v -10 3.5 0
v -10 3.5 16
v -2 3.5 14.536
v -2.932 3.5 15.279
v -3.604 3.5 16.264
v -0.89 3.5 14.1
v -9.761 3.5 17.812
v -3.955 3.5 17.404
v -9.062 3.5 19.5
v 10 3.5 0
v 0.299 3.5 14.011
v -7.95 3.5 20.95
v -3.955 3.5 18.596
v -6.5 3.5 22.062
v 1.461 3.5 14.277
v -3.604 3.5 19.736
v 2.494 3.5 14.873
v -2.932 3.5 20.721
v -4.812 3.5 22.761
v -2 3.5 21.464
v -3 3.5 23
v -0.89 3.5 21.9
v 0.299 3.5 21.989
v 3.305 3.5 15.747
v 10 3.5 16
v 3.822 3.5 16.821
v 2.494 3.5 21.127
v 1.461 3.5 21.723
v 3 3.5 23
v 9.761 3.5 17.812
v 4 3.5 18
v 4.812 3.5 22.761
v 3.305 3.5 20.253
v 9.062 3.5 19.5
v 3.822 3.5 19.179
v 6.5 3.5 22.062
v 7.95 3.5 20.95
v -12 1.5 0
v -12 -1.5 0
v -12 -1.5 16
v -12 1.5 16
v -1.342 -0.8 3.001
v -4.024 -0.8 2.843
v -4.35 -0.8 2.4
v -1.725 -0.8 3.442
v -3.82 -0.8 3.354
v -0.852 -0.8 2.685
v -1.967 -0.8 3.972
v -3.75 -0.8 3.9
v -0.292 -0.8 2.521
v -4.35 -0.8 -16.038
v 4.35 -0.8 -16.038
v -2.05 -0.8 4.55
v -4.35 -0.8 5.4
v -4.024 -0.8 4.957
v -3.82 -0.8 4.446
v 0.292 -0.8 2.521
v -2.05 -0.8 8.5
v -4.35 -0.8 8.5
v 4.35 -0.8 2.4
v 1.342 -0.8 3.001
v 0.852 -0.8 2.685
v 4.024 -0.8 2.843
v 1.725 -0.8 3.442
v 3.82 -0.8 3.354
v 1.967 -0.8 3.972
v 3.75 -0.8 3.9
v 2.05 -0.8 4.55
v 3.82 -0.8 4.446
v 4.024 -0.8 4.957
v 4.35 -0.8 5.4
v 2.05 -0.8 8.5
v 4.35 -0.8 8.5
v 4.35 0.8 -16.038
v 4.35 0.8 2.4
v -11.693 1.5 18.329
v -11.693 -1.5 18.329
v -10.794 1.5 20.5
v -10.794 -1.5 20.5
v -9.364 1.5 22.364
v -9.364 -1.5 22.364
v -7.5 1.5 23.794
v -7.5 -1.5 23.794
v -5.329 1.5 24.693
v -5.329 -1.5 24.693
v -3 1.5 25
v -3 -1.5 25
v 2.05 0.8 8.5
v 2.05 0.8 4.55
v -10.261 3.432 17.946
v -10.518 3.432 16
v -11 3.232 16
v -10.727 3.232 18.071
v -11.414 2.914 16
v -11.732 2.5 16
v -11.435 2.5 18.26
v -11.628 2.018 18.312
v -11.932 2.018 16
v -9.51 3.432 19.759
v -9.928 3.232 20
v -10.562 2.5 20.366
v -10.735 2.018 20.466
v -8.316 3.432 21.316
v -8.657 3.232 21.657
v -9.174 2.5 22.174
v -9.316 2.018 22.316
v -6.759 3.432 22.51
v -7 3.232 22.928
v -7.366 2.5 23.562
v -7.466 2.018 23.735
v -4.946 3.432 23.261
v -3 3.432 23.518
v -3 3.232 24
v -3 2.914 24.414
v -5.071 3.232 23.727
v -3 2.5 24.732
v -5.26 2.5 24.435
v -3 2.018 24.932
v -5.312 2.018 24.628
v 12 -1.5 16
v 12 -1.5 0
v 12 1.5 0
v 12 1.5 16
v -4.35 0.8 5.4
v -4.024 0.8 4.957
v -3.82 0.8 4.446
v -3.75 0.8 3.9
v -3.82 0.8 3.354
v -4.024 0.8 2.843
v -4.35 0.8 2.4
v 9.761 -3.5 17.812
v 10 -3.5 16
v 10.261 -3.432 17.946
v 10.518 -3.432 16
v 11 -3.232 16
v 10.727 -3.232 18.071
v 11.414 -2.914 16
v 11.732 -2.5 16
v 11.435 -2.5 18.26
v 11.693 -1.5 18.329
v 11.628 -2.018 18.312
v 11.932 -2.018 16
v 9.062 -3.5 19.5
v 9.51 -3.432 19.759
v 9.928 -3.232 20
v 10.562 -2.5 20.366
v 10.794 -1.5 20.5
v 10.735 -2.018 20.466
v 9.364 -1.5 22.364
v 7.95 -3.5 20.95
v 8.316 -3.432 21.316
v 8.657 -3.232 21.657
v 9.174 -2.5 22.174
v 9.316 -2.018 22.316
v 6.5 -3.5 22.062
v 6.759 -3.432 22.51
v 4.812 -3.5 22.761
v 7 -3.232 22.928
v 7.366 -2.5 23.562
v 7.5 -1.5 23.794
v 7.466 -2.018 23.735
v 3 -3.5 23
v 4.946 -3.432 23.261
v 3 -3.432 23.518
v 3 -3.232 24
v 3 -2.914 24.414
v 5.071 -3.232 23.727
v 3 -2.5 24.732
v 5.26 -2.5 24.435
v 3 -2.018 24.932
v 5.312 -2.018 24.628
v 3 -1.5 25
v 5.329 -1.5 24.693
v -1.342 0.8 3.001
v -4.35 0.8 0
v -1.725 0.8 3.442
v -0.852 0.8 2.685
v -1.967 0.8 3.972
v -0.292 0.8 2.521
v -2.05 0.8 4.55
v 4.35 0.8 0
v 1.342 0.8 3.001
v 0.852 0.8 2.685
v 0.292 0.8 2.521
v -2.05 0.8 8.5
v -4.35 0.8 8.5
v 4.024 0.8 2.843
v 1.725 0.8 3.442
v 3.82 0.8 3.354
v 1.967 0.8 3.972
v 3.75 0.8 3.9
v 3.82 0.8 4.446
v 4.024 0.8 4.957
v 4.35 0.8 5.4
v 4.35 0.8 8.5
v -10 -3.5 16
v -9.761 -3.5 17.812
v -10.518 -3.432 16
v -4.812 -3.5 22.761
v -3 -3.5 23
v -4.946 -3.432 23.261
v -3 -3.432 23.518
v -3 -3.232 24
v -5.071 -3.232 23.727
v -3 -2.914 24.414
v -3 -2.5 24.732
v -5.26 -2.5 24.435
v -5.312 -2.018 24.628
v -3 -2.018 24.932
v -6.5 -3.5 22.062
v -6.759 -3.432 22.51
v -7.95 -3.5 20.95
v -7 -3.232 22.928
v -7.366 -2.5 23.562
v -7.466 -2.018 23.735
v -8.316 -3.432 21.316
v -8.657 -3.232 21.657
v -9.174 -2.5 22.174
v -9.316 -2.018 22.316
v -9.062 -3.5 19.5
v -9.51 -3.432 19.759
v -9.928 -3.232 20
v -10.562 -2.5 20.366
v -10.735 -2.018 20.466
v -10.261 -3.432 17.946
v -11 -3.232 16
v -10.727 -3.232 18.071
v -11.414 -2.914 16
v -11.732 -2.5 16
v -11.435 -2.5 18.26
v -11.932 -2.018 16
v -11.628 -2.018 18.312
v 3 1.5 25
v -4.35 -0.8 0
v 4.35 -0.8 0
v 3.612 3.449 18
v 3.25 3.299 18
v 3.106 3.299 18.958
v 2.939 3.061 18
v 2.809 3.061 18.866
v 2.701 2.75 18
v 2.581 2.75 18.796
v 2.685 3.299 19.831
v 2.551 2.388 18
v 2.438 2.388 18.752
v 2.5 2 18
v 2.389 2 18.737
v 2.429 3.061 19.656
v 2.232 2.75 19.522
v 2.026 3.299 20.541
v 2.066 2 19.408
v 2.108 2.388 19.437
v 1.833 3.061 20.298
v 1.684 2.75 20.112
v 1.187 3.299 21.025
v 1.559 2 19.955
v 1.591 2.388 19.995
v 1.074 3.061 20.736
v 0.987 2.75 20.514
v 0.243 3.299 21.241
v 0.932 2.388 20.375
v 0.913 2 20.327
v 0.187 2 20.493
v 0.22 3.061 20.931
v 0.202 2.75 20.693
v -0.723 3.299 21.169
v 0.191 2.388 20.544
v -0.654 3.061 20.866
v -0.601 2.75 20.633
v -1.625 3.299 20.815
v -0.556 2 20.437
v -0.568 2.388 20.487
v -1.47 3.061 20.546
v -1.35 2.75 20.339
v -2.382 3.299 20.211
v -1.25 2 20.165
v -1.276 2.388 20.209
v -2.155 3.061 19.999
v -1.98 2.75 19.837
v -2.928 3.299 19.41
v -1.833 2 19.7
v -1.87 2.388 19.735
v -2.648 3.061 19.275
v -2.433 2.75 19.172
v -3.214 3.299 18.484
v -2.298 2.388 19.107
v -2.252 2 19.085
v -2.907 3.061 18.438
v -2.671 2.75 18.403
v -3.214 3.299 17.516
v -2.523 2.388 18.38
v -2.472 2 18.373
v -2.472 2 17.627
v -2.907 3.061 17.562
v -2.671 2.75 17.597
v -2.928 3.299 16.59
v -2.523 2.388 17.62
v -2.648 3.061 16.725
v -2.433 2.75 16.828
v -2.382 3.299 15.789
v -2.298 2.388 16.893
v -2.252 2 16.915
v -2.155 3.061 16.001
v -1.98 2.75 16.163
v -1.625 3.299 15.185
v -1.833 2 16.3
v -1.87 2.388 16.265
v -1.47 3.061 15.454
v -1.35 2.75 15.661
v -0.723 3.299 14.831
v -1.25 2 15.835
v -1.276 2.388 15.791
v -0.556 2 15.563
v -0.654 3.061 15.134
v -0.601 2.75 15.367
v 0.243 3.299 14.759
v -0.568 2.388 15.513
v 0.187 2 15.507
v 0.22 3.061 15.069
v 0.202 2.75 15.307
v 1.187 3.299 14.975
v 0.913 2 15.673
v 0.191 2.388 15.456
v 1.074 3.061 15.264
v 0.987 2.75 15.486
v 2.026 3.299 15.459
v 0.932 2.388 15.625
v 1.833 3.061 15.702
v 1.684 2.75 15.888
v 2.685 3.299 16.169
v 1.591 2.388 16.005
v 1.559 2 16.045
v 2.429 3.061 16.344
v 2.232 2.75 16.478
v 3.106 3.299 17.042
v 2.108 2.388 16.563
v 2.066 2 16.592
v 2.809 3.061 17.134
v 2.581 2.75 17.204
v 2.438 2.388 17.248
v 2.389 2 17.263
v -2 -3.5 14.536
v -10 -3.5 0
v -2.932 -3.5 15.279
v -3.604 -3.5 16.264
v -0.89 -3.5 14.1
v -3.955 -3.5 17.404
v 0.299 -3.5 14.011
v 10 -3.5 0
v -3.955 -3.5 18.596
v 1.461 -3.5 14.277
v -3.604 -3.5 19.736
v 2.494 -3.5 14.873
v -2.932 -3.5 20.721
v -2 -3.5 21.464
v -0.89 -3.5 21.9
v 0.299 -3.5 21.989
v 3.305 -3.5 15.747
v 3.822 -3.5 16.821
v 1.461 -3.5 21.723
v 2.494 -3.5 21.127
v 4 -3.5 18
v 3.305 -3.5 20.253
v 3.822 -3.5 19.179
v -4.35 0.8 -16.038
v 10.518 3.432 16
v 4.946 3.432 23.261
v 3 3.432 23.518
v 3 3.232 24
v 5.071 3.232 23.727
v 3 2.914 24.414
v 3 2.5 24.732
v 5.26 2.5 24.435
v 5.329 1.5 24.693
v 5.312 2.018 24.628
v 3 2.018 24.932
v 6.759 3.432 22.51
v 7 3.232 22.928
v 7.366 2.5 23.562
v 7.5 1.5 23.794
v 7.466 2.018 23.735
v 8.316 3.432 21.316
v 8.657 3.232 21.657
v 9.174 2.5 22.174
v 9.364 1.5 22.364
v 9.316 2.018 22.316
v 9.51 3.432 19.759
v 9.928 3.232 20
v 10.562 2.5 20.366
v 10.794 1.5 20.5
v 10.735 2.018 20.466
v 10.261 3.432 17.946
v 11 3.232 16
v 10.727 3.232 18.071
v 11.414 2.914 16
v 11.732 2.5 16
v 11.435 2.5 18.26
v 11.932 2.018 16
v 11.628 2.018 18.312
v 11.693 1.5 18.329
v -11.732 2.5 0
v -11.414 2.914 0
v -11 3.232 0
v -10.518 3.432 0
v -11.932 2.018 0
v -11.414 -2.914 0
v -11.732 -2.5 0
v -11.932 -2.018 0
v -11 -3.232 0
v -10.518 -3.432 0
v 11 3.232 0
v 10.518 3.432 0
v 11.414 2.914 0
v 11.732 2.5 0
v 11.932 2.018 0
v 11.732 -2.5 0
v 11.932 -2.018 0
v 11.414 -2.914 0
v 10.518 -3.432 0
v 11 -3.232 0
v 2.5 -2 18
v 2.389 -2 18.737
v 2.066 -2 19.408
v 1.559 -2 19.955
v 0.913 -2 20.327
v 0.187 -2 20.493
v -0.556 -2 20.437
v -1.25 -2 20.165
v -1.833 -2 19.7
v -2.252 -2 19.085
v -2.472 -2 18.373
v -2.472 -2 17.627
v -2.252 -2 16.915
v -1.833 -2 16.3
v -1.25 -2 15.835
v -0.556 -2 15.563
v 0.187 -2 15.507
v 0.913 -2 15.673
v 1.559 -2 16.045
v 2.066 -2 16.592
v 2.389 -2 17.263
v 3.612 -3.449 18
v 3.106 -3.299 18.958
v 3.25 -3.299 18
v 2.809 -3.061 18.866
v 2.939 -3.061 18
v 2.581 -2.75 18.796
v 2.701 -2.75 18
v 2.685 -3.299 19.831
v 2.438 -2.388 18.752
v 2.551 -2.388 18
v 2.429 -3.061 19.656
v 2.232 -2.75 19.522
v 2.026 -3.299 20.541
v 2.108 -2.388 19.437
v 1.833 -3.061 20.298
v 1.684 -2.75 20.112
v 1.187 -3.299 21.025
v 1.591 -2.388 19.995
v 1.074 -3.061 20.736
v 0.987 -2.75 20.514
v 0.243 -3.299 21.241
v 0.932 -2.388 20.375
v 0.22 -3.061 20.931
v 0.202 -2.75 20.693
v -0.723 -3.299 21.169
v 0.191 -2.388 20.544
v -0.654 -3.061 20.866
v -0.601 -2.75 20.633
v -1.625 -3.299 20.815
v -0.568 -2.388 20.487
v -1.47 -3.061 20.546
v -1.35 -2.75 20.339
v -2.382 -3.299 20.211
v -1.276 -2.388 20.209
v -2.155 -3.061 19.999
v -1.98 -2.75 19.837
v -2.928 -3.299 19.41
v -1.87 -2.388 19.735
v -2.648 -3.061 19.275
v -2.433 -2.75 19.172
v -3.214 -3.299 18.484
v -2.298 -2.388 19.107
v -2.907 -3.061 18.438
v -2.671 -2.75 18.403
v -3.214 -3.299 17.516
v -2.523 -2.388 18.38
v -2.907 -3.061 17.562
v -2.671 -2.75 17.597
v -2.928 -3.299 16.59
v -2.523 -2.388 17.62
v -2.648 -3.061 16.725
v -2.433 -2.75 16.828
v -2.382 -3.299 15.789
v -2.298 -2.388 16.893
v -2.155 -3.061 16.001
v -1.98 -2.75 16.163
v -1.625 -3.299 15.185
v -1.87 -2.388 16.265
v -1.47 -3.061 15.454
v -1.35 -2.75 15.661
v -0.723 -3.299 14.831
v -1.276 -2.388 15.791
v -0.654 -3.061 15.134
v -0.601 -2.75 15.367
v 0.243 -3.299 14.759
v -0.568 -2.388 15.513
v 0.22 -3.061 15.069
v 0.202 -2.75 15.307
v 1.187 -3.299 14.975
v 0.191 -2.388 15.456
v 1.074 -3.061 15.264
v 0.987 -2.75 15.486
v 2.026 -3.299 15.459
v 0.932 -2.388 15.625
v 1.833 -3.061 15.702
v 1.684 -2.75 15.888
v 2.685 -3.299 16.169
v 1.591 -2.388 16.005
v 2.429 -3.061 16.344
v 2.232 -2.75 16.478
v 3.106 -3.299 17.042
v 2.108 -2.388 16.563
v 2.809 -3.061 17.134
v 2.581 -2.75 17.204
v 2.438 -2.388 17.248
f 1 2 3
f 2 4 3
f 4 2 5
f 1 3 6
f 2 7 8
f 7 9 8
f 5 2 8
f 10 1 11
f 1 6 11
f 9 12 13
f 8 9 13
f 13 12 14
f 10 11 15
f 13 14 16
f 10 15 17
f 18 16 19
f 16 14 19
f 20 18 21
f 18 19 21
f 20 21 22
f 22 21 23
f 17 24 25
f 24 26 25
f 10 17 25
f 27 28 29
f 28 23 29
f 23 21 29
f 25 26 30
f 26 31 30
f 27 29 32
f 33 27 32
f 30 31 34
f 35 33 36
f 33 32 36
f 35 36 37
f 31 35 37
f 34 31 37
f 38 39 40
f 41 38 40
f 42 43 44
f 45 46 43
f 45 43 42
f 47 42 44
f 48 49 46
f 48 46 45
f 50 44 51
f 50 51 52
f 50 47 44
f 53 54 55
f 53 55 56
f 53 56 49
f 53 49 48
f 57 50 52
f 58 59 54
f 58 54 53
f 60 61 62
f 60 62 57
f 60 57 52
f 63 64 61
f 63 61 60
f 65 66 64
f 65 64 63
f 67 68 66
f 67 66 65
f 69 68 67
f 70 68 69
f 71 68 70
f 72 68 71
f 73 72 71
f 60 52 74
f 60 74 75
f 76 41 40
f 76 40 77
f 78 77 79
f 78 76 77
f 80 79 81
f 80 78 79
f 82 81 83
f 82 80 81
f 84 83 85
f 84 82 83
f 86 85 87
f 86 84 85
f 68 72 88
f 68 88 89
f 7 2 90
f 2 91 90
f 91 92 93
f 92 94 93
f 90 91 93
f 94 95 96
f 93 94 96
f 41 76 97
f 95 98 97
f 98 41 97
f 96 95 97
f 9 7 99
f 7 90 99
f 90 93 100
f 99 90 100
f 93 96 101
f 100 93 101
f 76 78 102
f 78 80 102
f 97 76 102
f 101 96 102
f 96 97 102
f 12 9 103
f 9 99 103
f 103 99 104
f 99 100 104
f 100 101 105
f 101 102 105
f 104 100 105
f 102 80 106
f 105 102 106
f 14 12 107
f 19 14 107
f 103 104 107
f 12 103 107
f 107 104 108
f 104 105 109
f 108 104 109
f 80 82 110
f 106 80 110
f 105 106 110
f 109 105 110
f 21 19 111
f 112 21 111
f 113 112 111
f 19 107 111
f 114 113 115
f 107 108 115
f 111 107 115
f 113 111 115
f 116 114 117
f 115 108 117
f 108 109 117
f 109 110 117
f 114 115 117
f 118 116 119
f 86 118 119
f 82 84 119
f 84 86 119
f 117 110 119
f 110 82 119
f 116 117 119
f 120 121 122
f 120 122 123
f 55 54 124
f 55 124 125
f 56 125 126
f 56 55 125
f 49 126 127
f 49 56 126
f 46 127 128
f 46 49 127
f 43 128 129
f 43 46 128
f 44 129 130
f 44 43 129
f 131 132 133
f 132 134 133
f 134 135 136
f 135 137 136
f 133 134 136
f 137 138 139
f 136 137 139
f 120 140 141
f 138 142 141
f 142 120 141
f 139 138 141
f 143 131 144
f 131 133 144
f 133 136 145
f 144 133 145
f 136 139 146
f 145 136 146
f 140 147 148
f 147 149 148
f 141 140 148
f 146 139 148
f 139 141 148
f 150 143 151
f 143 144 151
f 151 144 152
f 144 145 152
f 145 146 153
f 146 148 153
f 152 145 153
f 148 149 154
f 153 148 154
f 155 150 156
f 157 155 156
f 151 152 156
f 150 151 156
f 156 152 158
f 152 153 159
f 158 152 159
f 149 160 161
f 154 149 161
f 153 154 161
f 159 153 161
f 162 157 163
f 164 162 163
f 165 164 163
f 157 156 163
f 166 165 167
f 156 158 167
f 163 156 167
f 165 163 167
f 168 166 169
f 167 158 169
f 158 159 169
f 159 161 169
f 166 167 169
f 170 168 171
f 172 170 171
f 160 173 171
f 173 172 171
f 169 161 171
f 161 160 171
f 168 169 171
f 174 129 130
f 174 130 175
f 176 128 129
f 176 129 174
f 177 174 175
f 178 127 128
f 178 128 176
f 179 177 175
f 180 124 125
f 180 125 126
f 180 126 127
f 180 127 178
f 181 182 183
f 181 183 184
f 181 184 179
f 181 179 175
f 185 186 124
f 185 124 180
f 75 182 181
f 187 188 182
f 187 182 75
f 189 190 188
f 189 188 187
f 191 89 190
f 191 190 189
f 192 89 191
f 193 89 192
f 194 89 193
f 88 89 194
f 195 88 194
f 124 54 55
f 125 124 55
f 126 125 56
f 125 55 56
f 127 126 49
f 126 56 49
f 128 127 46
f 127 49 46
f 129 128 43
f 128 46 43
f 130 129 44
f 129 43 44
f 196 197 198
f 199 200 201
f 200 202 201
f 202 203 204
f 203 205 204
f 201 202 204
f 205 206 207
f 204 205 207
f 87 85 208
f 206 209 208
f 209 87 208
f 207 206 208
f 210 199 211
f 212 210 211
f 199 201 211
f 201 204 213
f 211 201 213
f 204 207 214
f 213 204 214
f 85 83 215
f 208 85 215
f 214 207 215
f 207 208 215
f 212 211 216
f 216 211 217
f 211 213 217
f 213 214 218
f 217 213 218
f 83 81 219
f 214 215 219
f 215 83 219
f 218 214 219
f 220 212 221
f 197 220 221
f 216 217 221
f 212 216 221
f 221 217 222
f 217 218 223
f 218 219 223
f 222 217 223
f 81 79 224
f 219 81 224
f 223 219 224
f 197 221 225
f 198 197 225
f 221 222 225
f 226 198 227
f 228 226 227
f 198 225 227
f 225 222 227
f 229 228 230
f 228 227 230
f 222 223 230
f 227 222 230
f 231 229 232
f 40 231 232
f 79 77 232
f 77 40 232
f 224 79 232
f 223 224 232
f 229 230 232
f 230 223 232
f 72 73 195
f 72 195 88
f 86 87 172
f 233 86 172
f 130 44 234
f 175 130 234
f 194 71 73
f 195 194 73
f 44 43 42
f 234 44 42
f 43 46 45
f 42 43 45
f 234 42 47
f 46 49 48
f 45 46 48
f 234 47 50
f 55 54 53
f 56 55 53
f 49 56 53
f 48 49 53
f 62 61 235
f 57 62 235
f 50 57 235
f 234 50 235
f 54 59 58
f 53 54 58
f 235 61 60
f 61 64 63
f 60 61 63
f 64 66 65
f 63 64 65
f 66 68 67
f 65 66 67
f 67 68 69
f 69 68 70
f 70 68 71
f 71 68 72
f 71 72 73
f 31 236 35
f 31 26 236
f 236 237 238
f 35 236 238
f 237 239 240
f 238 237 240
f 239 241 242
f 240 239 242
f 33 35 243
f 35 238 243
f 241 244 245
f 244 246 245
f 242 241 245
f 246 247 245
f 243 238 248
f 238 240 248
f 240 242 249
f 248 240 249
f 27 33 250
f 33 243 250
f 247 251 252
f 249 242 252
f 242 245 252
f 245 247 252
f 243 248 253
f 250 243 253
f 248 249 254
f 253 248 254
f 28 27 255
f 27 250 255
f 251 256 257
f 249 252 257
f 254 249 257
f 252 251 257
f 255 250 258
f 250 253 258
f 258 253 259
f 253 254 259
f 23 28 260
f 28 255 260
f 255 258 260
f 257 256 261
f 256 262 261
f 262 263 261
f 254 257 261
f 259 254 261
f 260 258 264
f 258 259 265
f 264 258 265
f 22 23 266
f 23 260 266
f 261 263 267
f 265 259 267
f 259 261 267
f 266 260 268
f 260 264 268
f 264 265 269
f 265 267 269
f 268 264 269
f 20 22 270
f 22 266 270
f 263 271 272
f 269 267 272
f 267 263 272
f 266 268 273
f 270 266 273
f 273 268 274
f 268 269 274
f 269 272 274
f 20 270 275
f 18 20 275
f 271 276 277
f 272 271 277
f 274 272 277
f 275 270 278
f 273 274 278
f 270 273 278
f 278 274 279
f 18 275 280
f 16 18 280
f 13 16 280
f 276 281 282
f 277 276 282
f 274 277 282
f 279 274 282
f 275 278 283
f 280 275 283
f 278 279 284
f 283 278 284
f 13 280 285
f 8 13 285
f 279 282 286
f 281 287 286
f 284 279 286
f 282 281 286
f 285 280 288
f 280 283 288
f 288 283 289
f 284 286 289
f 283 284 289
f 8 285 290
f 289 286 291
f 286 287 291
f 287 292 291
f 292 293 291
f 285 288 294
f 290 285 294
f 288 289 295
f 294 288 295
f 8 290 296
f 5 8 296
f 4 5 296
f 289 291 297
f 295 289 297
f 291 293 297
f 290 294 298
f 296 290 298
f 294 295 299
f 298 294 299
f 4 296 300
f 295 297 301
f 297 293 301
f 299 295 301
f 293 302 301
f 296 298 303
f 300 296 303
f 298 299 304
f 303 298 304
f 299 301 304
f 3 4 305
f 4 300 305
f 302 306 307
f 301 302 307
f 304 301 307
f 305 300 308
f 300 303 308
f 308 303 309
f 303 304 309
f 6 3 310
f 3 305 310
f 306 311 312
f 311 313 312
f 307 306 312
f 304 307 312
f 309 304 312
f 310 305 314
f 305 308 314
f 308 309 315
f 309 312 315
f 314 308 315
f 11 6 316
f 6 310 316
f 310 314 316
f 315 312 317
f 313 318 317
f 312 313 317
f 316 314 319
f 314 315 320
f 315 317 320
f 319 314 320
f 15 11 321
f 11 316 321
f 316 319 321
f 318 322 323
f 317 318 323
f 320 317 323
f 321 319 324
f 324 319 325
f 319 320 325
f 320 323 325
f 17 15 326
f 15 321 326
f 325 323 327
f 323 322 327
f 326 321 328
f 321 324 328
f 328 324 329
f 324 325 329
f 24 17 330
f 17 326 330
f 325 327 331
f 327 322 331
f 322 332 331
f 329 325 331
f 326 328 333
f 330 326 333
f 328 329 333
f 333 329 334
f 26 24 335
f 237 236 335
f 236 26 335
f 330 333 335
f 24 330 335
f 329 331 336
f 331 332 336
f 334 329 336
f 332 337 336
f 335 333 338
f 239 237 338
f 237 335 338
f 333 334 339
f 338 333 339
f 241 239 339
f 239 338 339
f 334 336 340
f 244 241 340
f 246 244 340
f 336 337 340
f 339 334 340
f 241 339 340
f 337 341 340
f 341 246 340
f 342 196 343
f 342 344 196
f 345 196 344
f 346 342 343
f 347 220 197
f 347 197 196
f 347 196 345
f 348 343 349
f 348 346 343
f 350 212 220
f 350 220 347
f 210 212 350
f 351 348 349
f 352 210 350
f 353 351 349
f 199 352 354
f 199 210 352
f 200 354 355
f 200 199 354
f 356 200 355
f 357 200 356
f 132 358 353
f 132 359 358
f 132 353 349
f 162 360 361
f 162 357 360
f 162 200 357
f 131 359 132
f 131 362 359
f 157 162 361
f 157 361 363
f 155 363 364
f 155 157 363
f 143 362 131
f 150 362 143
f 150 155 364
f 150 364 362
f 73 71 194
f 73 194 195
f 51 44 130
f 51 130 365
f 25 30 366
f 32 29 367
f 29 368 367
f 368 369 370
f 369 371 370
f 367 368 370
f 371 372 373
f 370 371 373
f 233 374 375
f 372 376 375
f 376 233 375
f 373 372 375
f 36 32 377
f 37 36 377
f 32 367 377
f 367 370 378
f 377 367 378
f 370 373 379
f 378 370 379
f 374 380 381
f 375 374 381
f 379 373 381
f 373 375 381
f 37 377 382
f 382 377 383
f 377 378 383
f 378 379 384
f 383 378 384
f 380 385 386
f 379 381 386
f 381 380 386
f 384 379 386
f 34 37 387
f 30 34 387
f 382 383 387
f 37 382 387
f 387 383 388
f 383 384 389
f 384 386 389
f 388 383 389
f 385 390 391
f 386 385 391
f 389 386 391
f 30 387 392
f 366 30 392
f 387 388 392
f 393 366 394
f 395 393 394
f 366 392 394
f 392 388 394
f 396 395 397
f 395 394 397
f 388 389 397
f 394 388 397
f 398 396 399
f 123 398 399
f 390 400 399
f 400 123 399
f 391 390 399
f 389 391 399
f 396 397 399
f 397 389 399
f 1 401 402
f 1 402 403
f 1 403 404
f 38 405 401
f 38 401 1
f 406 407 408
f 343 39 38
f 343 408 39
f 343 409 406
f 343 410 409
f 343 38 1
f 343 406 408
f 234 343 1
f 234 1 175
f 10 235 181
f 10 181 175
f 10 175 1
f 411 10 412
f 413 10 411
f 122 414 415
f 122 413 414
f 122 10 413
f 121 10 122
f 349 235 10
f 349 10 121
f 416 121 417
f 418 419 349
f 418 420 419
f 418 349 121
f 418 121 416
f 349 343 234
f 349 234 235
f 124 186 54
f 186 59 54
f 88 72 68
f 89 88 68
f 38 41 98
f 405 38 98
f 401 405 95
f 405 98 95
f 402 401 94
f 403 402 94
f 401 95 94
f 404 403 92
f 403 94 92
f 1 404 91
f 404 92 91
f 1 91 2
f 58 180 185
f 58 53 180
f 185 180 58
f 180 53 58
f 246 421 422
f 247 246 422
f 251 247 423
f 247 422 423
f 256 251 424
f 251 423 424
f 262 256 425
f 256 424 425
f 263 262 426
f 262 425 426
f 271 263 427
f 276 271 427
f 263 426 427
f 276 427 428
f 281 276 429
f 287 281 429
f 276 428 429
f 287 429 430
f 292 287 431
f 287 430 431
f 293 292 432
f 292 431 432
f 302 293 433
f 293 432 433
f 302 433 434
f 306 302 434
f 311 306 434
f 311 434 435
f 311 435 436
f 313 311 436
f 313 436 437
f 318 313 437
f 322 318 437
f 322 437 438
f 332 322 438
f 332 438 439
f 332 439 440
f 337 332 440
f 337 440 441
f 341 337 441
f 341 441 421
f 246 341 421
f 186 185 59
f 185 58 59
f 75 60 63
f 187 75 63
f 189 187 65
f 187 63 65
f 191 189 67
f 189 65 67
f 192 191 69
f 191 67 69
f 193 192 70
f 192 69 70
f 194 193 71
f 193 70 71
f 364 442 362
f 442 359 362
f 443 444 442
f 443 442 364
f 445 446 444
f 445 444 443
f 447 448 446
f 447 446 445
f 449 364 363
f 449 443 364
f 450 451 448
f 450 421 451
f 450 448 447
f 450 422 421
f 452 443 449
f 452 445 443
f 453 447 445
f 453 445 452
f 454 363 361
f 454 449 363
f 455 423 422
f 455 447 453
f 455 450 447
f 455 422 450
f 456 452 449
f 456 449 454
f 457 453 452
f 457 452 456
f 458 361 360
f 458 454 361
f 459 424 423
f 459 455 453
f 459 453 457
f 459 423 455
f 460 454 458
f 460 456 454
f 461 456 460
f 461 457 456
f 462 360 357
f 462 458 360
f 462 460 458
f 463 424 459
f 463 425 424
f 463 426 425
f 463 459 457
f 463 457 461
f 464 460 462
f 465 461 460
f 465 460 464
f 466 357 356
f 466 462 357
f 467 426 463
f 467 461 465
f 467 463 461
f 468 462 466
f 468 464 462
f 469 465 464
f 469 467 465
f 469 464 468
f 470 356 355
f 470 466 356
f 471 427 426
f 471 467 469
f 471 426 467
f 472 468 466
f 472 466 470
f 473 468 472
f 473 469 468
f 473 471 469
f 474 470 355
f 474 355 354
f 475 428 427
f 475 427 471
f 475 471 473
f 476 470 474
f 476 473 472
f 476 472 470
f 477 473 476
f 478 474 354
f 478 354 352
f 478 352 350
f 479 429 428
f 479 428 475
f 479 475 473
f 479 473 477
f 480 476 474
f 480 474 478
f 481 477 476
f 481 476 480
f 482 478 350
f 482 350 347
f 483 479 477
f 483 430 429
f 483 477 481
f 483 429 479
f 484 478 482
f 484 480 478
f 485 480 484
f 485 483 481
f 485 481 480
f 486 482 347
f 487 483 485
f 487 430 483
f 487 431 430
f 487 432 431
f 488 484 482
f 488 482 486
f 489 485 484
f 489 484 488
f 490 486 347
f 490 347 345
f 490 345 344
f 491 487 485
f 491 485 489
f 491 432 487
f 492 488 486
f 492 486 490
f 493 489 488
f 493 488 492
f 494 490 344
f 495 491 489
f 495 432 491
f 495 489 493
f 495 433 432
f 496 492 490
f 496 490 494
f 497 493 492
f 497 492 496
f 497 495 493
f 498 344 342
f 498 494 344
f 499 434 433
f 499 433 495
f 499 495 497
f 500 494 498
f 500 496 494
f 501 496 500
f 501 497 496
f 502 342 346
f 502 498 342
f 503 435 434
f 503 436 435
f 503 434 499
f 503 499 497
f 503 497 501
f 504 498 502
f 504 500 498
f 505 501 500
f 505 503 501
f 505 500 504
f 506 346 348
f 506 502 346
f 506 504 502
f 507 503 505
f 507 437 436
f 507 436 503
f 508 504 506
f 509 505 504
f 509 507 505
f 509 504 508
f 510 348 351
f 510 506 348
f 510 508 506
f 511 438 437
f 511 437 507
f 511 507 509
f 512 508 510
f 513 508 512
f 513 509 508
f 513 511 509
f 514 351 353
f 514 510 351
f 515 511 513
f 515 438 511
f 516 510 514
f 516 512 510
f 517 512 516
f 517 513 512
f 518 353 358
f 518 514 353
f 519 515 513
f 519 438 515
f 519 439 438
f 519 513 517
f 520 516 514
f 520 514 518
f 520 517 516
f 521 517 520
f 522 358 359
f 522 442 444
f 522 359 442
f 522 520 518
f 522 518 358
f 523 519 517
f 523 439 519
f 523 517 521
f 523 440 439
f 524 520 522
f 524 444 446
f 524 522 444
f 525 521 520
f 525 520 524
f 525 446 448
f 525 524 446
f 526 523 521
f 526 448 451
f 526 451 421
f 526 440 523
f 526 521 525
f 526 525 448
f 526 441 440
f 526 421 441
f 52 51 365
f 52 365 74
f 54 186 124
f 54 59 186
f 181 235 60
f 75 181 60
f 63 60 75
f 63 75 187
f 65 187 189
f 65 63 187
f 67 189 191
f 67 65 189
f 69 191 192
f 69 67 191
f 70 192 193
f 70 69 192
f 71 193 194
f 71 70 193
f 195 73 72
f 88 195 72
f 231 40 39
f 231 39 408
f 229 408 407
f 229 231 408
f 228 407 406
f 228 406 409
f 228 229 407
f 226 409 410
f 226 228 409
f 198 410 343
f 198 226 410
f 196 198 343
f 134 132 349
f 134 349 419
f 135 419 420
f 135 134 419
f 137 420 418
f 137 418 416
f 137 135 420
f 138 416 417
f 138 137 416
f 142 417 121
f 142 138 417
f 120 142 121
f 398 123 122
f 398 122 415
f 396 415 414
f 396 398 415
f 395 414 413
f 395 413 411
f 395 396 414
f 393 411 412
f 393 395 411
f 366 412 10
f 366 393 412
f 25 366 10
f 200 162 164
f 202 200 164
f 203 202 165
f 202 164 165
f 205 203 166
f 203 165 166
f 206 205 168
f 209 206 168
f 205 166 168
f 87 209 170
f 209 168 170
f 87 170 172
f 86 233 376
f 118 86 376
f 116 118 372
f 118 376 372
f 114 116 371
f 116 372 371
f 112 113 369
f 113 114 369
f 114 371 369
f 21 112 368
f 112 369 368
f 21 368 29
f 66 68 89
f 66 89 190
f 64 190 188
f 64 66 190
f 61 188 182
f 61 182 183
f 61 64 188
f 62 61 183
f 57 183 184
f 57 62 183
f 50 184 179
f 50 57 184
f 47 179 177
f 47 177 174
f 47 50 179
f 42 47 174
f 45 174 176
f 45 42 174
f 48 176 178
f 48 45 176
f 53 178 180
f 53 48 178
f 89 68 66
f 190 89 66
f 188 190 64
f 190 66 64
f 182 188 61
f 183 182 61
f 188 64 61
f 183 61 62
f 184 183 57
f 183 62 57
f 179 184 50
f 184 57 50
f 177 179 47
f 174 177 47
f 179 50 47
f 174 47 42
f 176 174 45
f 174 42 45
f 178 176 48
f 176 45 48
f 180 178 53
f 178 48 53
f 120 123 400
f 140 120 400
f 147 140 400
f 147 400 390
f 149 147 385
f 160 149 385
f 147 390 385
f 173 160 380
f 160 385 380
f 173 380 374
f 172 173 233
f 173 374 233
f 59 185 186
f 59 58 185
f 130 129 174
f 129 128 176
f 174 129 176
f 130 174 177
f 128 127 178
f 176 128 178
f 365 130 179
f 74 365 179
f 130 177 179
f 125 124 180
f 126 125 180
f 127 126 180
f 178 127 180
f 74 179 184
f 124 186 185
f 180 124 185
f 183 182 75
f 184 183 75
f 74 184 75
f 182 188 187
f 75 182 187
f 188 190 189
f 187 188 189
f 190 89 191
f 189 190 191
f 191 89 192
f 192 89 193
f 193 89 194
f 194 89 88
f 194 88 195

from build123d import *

# Parameters (mm, degrees)
F0_W         = 24
F0_H         = 25
F1_DEPTH     = 3.5
F2_R         = 2
F4_DEPTH     = 0.8
F5_R         = 2.5
F6_DEPTH     = 7.001
F8_R         = 1.5
F9_T1_DEPTH  = 7
F9_T4_ANGLE  = 90
F9_T6_ANGLE  = 90
F9_T8_ANGLE  = 90
F9_T10_ANGLE = 90


# Not quite as in the source:
# - a fillet or chamfer that OpenCascade refuses, or shapes differently, is made with other operations: its cross-section is extruded or revolved along the edge and cut away or added


with BuildPart() as f1:
    # F0 (on Front) → F1 (new body, symmetric)
    with BuildSketch(Plane.XZ):
        with Locations((0, 12.5)):
            Rectangle(F0_W, F0_H)
    extrude(amount=F1_DEPTH, both=True)

    # F2
    f2_edges = [f1.edges().sort_by_distance(p)[0] for p in [
        (0, -3.5, 25),
        (0, 3.5, 25),
        (-12, -3.5, 12.5),
        (-12, 3.5, 12.5),
        (12, -3.5, 12.5),
        (12, 3.5, 12.5),
    ]]
    fillet(f2_edges, radius=F2_R)

    # F5 (on face) → F6 (cut, through all)
    with BuildSketch(Plane.XZ.offset(3.5)):
        with Locations((0, 18)):
            Circle(F5_R)
    extrude(amount=-F6_DEPTH, mode=Mode.SUBTRACT)


with BuildPart() as f4:
    # F3 (on Front) → F4 (new body, symmetric)
    with BuildSketch(Plane.XZ):
        with BuildLine():
            Line((-4.35, 8.5), (-4.35, 5.4))
            ThreePointArc((-4.35, 5.4), (-3.75, 3.9), (-4.35, 2.4))
            Line((-4.35, 2.4), (-4.35, -16.0384941622))
            Line((-4.35, -16.0384941622), (4.35, -16.0384941622))
            Line((4.35, -16.0384941622), (4.35, 2.4))
            ThreePointArc((4.35, 2.4), (3.75, 3.9), (4.35, 5.4))
            Line((4.35, 5.4), (4.35, 8.5))
            Line((4.35, 8.5), (2.05, 8.5))
            Line((2.05, 8.5), (2.05, 4.55))
            ThreePointArc((2.05, 4.55), (0, 2.5), (-2.05, 4.55))
            Line((-2.05, 4.55), (-2.05, 8.5))
            Line((-2.05, 8.5), (-4.35, 8.5))
        make_face()
    extrude(amount=F4_DEPTH, both=True)


with BuildPart() as f1_1:
    add(f1.part)

    # F7: cut F4
    add(f4.part, mode=Mode.SUBTRACT)

    # F8
    f8_edges = [f1_1.edges().sort_by_distance(p)[0] for p in [
        (-2.5, 3.5, 18),
        (-2.5, -3.5, 18),
    ]]
    fillet(f8_edges, radius=F8_R)

    # F9: fillet of radius 9 on 2 edges, made by hand

    # F9_s2 → F9_t1 (cut)
    with BuildSketch(Plane.XZ.offset(-3.5)):
        with BuildLine():
            ThreePointArc((12, 16), (9.3639610307, 22.3639610307), (3, 25))
            Line((3, 25), (12, 25))
            Line((12, 25), (12, 16))
        make_face()
        with BuildLine():
            ThreePointArc((-12, 16), (-9.3639610307, 22.3639610307), (-3, 25))
            Line((-3, 25), (-12, 25))
            Line((-12, 25), (-12, 16))
        make_face()
    extrude(amount=F9_T1_DEPTH, mode=Mode.SUBTRACT)

    # F9_s3 → F9_t4 (revolve, cut)
    with BuildSketch(Plane.XY.offset(16)):
        with BuildLine():
            ThreePointArc((-10, 3.5), (-11.4142135624, 2.9142135624), (-12, 1.5))
            Line((-12, 1.5), (-12, 3.5))
            Line((-12, 3.5), (-10, 3.5))
        make_face()
    revolve(axis=Axis((-3, 3.5, 16), (0, 1, 0)), revolution_arc=F9_T4_ANGLE, mode=Mode.SUBTRACT)

    # F9_s5 → F9_t6 (revolve, cut)
    with BuildSketch(Plane.YZ.offset(-3)):
        with BuildLine():
            ThreePointArc((-3.5, 23), (-2.9142135624, 24.4142135624), (-1.5, 25))
            Line((-1.5, 25), (-3.5, 25))
            Line((-3.5, 25), (-3.5, 23))
        make_face()
    revolve(axis=Axis((-3, -3.5, 16), (0, -1, 0)), revolution_arc=F9_T6_ANGLE, mode=Mode.SUBTRACT)

    # F9_s7 → F9_t8 (revolve, cut)
    with BuildSketch(Plane.XY.offset(16)):
        with BuildLine():
            ThreePointArc((10, -3.5), (11.4142135624, -2.9142135624), (12, -1.5))
            Line((12, -1.5), (12, -3.5))
            Line((12, -3.5), (10, -3.5))
        make_face()
    revolve(axis=Axis((3, -3.5, 16), (0, -1, 0)), revolution_arc=F9_T8_ANGLE, mode=Mode.SUBTRACT)

    # F9_s9 → F9_t10 (revolve, cut)
    with BuildSketch(Plane.YZ.offset(3)):
        with BuildLine():
            ThreePointArc((3.5, 23), (2.9142135624, 24.4142135624), (1.5, 25))
            Line((1.5, 25), (3.5, 25))
            Line((3.5, 25), (3.5, 23))
        make_face()
    revolve(axis=Axis((3, 3.5, 16), (0, 1, 0)), revolution_arc=F9_T10_ANGLE, mode=Mode.SUBTRACT)


solid = Compound([f4.part, f1_1.part])
